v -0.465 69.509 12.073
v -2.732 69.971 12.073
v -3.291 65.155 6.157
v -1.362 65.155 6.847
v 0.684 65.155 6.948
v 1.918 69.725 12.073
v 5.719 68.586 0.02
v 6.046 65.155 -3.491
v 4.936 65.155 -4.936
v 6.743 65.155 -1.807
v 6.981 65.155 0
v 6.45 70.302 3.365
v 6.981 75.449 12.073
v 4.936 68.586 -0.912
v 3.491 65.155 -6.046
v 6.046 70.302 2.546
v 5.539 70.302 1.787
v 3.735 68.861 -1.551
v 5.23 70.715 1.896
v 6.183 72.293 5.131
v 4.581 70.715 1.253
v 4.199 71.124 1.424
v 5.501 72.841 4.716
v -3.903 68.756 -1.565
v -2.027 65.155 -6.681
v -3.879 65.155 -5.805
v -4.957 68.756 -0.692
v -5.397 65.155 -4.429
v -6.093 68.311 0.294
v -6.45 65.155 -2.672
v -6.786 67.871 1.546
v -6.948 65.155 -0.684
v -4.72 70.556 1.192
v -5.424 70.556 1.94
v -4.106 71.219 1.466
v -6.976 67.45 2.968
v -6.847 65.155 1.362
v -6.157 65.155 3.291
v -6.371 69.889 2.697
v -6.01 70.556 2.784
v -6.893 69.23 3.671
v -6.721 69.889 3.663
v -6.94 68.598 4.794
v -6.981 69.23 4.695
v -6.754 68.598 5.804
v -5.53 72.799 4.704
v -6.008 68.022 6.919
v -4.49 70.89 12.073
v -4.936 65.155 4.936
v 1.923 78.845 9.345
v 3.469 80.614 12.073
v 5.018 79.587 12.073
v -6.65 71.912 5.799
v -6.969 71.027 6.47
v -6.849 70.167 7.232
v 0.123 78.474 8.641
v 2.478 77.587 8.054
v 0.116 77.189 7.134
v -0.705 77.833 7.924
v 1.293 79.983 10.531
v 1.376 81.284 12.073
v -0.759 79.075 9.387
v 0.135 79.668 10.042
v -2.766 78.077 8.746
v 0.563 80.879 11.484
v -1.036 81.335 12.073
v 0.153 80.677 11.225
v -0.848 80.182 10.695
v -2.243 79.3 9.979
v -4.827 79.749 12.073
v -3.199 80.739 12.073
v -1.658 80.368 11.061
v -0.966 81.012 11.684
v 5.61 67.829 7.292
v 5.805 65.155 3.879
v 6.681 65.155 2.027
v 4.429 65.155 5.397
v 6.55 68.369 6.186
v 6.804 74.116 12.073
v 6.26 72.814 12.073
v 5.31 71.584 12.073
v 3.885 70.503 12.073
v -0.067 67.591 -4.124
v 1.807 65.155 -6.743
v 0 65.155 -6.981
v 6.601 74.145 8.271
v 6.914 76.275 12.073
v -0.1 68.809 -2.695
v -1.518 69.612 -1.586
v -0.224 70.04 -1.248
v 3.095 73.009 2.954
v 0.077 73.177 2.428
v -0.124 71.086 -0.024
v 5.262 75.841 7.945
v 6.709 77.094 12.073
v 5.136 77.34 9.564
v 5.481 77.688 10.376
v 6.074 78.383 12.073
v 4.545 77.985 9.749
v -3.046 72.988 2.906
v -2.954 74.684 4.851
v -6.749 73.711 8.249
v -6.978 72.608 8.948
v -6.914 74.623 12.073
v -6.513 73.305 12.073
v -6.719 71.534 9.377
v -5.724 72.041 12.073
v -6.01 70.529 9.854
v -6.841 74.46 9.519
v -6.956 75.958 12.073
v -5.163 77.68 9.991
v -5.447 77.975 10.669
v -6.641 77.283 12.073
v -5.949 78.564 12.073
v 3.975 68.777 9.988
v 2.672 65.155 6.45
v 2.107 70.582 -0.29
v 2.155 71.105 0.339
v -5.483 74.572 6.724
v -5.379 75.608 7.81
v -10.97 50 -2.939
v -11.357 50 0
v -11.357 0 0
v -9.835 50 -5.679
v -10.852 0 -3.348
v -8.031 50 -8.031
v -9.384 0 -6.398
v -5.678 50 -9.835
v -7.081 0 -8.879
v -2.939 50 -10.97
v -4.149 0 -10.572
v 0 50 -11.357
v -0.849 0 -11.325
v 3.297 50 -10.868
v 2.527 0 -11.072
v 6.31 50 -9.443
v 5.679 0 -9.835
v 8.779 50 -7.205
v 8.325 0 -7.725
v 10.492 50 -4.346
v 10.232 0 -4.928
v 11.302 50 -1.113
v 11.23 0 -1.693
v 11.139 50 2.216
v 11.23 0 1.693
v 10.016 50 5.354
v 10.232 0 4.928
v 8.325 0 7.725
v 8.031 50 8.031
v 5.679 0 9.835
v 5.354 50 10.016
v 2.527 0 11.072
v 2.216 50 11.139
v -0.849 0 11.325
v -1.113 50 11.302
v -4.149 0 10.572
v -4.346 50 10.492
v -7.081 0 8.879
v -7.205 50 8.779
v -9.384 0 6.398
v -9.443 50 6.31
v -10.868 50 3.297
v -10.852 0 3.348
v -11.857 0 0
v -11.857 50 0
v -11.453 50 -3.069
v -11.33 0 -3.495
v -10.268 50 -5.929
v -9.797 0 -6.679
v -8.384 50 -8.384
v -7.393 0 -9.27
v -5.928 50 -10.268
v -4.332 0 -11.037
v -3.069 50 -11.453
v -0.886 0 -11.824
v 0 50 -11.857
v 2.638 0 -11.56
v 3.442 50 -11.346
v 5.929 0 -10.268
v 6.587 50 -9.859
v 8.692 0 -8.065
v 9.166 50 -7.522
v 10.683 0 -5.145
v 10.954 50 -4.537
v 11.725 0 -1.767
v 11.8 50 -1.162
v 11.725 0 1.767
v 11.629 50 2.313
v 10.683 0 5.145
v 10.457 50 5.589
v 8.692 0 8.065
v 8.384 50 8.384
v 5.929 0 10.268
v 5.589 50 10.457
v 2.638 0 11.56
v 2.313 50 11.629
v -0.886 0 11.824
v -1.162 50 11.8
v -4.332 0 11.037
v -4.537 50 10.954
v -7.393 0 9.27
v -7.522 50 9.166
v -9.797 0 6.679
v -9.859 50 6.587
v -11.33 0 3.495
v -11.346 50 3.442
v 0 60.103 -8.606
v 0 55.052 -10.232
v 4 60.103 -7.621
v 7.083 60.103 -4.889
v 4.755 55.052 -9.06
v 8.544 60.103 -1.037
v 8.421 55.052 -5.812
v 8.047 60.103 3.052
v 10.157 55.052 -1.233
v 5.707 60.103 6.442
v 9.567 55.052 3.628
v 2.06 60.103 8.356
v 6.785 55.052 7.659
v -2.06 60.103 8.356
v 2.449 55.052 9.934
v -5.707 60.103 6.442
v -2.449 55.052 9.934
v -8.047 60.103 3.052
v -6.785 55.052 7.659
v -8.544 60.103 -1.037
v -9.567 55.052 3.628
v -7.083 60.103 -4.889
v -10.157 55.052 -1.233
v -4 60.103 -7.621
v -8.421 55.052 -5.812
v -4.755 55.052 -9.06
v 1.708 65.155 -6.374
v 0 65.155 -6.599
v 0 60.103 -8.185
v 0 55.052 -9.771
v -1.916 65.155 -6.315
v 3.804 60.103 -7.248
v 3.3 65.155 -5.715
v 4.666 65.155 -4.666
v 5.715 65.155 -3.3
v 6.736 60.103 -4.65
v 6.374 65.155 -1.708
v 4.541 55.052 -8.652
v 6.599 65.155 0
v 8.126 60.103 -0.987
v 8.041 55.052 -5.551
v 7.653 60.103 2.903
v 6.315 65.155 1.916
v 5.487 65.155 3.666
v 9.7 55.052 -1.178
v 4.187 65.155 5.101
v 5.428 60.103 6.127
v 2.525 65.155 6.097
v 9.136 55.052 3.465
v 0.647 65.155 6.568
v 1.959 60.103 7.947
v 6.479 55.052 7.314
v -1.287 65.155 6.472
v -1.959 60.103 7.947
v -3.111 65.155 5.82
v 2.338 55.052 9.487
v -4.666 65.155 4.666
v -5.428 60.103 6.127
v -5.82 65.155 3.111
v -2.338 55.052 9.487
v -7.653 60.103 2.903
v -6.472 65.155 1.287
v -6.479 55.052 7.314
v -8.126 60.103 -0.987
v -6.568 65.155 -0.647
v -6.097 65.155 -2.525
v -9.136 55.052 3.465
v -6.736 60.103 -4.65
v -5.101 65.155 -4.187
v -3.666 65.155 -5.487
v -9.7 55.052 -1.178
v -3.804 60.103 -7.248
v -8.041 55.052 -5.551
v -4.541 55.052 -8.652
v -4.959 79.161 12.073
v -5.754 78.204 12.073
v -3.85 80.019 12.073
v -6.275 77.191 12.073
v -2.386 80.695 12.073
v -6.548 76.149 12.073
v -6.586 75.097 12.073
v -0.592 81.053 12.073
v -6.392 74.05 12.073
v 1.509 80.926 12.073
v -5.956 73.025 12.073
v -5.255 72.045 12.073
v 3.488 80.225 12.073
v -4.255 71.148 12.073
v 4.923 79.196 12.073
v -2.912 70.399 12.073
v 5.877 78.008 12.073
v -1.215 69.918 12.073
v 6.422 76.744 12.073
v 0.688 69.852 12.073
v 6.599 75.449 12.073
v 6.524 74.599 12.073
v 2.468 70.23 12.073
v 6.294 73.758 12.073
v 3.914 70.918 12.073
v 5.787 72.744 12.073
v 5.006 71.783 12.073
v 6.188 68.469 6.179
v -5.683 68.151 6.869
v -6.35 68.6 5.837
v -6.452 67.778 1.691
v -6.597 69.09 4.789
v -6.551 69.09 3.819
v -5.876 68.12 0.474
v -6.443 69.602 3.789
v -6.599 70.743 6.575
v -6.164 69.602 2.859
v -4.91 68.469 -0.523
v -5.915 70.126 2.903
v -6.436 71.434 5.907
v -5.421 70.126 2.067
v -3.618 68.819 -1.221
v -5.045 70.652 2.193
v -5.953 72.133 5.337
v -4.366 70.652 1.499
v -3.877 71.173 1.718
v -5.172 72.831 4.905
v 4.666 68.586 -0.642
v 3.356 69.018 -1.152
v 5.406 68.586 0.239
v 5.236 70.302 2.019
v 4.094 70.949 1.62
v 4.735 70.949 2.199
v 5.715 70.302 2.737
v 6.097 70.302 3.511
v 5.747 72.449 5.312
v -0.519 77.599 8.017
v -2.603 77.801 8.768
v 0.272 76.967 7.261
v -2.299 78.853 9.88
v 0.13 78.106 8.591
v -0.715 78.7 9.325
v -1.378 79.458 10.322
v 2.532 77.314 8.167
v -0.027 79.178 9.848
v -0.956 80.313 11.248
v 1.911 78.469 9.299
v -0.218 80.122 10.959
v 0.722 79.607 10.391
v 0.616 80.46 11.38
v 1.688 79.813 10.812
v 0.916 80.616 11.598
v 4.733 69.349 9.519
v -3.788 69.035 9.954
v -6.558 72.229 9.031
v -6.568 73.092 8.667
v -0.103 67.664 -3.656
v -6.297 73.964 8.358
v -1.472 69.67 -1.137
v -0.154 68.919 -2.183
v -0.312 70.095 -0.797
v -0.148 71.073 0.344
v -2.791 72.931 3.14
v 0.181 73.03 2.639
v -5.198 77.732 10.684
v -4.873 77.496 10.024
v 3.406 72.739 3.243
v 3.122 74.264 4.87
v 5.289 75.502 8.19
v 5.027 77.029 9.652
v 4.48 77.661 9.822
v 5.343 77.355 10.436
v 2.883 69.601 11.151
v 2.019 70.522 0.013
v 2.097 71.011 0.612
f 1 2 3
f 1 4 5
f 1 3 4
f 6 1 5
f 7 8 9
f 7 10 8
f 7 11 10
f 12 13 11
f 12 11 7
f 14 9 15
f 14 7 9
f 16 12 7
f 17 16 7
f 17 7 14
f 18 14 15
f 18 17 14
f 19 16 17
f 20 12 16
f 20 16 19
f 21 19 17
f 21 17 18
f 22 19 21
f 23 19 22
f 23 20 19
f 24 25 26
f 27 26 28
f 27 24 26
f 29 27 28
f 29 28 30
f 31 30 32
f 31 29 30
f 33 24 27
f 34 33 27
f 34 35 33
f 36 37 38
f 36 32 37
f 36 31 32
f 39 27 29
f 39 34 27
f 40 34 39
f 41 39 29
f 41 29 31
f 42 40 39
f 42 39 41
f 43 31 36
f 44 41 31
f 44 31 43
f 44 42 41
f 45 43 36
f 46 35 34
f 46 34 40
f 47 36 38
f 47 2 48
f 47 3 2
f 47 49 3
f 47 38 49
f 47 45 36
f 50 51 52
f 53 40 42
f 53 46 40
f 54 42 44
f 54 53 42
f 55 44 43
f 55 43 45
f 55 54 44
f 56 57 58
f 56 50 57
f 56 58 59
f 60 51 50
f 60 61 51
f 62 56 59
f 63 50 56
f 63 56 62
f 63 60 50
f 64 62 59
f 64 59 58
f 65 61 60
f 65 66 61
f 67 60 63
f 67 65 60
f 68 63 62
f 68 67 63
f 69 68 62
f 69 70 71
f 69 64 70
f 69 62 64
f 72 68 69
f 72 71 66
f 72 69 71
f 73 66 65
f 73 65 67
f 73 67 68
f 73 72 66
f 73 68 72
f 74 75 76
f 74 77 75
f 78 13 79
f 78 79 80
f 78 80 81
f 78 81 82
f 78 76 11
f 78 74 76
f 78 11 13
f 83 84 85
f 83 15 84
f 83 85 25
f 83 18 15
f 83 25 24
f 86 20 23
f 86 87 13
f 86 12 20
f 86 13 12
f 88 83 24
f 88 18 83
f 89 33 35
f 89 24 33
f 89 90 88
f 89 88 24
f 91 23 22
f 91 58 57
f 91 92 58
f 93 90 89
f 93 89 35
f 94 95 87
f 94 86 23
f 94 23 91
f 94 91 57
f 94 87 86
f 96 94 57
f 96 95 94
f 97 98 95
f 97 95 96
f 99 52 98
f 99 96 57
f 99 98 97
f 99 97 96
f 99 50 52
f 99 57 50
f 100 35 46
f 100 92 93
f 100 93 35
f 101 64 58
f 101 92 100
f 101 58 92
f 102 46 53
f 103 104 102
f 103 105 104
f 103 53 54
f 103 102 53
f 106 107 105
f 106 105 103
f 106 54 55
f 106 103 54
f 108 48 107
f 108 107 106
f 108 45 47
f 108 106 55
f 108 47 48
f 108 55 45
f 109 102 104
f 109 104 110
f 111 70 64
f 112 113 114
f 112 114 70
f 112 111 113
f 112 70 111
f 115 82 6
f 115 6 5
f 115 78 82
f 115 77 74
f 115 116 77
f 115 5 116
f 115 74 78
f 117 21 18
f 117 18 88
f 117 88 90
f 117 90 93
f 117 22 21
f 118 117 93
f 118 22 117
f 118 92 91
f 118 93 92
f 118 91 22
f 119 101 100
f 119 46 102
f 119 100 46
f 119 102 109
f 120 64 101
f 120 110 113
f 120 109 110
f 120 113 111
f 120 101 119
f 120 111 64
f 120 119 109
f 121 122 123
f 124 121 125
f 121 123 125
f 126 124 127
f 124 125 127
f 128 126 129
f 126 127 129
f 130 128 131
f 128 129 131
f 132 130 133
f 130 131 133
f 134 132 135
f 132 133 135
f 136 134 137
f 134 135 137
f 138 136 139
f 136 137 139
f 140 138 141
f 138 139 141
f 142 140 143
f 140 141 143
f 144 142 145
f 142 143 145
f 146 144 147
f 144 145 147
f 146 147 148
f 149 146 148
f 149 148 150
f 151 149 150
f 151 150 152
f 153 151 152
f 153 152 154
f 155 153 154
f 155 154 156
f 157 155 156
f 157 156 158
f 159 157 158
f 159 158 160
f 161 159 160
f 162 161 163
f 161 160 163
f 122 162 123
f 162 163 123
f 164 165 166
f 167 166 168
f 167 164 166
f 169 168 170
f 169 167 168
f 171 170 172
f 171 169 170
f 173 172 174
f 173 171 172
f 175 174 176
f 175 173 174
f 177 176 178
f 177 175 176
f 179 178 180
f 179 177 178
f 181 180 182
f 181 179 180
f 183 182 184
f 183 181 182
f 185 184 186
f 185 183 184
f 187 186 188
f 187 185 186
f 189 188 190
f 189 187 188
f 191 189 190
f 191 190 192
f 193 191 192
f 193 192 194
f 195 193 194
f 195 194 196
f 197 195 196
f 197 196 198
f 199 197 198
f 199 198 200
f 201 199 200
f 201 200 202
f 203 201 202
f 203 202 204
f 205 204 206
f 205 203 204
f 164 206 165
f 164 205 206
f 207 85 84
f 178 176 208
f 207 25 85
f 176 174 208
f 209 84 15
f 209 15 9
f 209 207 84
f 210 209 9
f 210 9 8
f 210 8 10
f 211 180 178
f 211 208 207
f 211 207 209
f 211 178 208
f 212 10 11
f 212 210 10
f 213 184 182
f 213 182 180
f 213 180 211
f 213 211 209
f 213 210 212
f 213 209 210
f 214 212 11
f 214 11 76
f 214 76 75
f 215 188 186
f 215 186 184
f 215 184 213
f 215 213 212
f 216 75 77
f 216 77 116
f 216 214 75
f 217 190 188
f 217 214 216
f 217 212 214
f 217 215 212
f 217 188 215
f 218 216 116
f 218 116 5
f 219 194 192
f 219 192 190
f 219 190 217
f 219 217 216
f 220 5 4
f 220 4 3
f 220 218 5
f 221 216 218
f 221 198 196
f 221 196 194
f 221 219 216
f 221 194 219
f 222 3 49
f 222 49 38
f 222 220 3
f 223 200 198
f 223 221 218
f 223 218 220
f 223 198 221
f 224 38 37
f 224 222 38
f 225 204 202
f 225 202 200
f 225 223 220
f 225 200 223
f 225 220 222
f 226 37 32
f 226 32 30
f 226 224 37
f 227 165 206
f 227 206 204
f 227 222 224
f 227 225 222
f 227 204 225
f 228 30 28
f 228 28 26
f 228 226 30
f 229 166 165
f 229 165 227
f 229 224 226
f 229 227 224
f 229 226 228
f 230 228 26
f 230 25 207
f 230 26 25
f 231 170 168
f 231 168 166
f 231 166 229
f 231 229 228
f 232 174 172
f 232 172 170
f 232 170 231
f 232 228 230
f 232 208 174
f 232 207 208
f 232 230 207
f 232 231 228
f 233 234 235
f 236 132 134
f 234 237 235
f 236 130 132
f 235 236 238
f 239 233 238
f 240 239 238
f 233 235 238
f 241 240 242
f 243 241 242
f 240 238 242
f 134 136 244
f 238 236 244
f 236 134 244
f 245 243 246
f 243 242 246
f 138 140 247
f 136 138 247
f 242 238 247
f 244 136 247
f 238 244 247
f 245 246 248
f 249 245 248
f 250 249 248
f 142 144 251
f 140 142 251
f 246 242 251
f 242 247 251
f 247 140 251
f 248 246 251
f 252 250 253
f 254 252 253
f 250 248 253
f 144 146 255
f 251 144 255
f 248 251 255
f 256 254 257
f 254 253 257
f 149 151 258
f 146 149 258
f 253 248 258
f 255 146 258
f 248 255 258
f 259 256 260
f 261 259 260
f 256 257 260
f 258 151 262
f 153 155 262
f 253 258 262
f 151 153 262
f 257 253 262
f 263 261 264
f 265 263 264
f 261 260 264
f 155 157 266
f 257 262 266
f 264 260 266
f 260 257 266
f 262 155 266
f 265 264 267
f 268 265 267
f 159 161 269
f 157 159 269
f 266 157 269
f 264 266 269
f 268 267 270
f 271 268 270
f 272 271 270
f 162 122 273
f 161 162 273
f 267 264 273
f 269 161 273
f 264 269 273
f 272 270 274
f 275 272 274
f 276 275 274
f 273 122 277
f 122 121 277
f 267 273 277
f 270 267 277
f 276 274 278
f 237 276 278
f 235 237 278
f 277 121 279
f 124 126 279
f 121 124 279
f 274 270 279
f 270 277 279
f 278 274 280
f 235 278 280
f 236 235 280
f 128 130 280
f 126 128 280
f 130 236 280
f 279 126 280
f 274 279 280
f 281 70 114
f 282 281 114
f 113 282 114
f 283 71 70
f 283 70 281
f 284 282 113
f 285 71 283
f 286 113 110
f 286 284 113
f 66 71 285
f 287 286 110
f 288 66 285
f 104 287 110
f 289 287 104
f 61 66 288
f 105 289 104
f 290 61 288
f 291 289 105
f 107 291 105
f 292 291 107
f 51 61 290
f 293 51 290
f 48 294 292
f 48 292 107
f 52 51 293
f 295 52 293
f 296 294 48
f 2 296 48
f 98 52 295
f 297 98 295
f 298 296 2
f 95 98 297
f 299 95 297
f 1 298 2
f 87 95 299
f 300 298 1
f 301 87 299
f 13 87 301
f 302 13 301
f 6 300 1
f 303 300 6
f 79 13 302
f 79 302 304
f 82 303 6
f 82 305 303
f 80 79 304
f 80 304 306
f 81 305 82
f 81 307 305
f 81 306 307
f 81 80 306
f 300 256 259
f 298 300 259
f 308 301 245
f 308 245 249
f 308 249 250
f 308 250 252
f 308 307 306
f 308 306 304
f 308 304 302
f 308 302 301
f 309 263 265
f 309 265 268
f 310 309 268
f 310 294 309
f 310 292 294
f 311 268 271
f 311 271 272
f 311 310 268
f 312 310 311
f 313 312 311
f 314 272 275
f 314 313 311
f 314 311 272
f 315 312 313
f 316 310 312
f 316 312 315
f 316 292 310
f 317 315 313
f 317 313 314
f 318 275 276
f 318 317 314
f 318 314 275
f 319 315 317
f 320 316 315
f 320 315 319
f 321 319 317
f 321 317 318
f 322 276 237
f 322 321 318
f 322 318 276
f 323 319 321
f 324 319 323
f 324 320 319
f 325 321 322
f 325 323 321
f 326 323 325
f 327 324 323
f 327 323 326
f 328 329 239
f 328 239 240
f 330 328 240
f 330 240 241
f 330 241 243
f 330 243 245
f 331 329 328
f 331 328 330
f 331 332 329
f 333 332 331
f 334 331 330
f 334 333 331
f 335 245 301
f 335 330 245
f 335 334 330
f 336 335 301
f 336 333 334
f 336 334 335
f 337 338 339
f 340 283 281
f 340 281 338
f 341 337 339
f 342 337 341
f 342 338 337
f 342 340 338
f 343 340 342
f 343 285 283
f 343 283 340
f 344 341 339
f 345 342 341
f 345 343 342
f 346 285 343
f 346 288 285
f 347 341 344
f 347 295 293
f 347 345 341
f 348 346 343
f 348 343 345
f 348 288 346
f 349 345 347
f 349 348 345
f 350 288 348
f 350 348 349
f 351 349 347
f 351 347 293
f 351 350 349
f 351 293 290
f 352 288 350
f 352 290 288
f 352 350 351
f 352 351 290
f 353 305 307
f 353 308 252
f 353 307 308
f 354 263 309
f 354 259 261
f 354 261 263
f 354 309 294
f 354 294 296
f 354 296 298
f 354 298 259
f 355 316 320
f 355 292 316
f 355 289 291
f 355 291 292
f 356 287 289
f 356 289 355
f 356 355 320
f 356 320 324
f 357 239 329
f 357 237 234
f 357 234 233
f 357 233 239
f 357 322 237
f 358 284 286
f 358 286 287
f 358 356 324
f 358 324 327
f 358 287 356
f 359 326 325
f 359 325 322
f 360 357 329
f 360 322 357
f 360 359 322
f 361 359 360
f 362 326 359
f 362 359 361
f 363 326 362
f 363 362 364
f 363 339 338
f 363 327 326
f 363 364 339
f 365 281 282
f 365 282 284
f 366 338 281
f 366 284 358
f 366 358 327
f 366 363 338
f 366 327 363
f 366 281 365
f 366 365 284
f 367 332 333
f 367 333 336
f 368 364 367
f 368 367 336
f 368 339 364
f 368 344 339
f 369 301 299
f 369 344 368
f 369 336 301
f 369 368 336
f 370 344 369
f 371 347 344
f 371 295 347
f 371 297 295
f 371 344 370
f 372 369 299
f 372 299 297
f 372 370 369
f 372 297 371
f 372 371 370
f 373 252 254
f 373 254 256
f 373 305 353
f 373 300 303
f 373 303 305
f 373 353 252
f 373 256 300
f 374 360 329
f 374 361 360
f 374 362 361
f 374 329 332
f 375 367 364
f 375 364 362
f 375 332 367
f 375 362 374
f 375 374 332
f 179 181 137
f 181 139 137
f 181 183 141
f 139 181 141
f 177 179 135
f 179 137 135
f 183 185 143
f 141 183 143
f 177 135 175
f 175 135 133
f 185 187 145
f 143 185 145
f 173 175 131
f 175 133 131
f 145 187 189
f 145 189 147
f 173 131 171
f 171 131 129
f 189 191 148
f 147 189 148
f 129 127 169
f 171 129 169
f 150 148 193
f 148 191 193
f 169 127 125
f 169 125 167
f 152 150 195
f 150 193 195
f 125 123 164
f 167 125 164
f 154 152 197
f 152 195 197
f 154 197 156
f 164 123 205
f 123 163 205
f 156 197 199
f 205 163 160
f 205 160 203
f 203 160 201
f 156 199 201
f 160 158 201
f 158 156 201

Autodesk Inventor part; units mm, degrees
ref_plane "YZ Plane" through (0, 0, 0) normal (1, 0, 0) x (0, 1, 0)
ref_plane "XZ Plane" through (0, 0, 0) normal (0, 1, 0) x (-1, 0, 0)
sketch "Esquisse1" plane through (0, 0, 0) normal (0, 1, 0) x (-1, 0, 0)
  circle A0 centre (0, 0) radius 11.857
  circle A1 centre (0, 0) radius 11.357
  dimension "d0" = 23.714
  dimension "d1" = 0.5
extrude "Extrusion1" add sketch "Esquisse1" along normal blind 50
sketch "Esquisse3" plane through (0, 0, 0) normal (1, 0, 0) x (0, 1, 0)
  line L0 (50, -11.857) -> (50, 11.857) projected
  line L1 (50, -11.857) -> (50, -11.357)
  line L2 (50, -11.857) -> (65.1546, -6.9812)
  line L3 (65.1546, -6.9812) -> (65.1546, -6.5993)
  line L4 (65.1546, -6.5993) -> (50, -11.357)
  point P0 (0, 0)
sketch "Esquisse4" plane through (0, 0, 0) normal (1, 0, 0) x (0, 1, 0)
  line L0 (89.7518, 0) -> (0, 0)
  line L1 (50, -11.857) -> (50, 11.857) projected
  line L2 (65.5189, 0) -> (87.7272, 26.0465)
revolve "Révolution1" add sketch "Esquisse3" angle 360 about axis through (0, 89.7518, 0) along (0, -1, 0)
sketch "Esquisse6" plane through (0, 0, 0) normal (1, 0, 0) x (0, 1, 0)
  line L0 (0, -11.857) -> (0, 11.857) projected
  line L1 (0, 11.857) -> (102.0428, 11.857)
  point P0 (0, 0)
ref_plane "Plan de construction1" through (0, 0, 11.857) normal (0, 0, 1) x (1, 0, 0)
sketch "Esquisse10" plane through (0, 65.1546, 0) normal (0, 1, 0) x (1, 0, 0)
  circle A0 centre (0, 0) radius 6.5993
  circle A1 centre (0, 0) radius 6.9812
sweep "Balayage1" add profiles "Esquisse10" path "Esquisse4" path curves L2
sketch "Esquisse13" plane through (0, 0, 0) normal (1, 0, 0) x (0, 1, 0)
  line L0 (101.04, 12.0731) -> (64.1022, 12.0731)
  line L1 (64.1022, 12.0731) -> (64.1022, 38.95)
  line L2 (64.1022, 38.95) -> (101.04, 38.95)
  line L3 (101.04, 38.95) -> (101.04, 12.0731)
  point P0 (0, 0)
extrude "Extrusion2" cut sketch "Esquisse13" against normal mid plane 50
properties material "PMMA Plastic"
